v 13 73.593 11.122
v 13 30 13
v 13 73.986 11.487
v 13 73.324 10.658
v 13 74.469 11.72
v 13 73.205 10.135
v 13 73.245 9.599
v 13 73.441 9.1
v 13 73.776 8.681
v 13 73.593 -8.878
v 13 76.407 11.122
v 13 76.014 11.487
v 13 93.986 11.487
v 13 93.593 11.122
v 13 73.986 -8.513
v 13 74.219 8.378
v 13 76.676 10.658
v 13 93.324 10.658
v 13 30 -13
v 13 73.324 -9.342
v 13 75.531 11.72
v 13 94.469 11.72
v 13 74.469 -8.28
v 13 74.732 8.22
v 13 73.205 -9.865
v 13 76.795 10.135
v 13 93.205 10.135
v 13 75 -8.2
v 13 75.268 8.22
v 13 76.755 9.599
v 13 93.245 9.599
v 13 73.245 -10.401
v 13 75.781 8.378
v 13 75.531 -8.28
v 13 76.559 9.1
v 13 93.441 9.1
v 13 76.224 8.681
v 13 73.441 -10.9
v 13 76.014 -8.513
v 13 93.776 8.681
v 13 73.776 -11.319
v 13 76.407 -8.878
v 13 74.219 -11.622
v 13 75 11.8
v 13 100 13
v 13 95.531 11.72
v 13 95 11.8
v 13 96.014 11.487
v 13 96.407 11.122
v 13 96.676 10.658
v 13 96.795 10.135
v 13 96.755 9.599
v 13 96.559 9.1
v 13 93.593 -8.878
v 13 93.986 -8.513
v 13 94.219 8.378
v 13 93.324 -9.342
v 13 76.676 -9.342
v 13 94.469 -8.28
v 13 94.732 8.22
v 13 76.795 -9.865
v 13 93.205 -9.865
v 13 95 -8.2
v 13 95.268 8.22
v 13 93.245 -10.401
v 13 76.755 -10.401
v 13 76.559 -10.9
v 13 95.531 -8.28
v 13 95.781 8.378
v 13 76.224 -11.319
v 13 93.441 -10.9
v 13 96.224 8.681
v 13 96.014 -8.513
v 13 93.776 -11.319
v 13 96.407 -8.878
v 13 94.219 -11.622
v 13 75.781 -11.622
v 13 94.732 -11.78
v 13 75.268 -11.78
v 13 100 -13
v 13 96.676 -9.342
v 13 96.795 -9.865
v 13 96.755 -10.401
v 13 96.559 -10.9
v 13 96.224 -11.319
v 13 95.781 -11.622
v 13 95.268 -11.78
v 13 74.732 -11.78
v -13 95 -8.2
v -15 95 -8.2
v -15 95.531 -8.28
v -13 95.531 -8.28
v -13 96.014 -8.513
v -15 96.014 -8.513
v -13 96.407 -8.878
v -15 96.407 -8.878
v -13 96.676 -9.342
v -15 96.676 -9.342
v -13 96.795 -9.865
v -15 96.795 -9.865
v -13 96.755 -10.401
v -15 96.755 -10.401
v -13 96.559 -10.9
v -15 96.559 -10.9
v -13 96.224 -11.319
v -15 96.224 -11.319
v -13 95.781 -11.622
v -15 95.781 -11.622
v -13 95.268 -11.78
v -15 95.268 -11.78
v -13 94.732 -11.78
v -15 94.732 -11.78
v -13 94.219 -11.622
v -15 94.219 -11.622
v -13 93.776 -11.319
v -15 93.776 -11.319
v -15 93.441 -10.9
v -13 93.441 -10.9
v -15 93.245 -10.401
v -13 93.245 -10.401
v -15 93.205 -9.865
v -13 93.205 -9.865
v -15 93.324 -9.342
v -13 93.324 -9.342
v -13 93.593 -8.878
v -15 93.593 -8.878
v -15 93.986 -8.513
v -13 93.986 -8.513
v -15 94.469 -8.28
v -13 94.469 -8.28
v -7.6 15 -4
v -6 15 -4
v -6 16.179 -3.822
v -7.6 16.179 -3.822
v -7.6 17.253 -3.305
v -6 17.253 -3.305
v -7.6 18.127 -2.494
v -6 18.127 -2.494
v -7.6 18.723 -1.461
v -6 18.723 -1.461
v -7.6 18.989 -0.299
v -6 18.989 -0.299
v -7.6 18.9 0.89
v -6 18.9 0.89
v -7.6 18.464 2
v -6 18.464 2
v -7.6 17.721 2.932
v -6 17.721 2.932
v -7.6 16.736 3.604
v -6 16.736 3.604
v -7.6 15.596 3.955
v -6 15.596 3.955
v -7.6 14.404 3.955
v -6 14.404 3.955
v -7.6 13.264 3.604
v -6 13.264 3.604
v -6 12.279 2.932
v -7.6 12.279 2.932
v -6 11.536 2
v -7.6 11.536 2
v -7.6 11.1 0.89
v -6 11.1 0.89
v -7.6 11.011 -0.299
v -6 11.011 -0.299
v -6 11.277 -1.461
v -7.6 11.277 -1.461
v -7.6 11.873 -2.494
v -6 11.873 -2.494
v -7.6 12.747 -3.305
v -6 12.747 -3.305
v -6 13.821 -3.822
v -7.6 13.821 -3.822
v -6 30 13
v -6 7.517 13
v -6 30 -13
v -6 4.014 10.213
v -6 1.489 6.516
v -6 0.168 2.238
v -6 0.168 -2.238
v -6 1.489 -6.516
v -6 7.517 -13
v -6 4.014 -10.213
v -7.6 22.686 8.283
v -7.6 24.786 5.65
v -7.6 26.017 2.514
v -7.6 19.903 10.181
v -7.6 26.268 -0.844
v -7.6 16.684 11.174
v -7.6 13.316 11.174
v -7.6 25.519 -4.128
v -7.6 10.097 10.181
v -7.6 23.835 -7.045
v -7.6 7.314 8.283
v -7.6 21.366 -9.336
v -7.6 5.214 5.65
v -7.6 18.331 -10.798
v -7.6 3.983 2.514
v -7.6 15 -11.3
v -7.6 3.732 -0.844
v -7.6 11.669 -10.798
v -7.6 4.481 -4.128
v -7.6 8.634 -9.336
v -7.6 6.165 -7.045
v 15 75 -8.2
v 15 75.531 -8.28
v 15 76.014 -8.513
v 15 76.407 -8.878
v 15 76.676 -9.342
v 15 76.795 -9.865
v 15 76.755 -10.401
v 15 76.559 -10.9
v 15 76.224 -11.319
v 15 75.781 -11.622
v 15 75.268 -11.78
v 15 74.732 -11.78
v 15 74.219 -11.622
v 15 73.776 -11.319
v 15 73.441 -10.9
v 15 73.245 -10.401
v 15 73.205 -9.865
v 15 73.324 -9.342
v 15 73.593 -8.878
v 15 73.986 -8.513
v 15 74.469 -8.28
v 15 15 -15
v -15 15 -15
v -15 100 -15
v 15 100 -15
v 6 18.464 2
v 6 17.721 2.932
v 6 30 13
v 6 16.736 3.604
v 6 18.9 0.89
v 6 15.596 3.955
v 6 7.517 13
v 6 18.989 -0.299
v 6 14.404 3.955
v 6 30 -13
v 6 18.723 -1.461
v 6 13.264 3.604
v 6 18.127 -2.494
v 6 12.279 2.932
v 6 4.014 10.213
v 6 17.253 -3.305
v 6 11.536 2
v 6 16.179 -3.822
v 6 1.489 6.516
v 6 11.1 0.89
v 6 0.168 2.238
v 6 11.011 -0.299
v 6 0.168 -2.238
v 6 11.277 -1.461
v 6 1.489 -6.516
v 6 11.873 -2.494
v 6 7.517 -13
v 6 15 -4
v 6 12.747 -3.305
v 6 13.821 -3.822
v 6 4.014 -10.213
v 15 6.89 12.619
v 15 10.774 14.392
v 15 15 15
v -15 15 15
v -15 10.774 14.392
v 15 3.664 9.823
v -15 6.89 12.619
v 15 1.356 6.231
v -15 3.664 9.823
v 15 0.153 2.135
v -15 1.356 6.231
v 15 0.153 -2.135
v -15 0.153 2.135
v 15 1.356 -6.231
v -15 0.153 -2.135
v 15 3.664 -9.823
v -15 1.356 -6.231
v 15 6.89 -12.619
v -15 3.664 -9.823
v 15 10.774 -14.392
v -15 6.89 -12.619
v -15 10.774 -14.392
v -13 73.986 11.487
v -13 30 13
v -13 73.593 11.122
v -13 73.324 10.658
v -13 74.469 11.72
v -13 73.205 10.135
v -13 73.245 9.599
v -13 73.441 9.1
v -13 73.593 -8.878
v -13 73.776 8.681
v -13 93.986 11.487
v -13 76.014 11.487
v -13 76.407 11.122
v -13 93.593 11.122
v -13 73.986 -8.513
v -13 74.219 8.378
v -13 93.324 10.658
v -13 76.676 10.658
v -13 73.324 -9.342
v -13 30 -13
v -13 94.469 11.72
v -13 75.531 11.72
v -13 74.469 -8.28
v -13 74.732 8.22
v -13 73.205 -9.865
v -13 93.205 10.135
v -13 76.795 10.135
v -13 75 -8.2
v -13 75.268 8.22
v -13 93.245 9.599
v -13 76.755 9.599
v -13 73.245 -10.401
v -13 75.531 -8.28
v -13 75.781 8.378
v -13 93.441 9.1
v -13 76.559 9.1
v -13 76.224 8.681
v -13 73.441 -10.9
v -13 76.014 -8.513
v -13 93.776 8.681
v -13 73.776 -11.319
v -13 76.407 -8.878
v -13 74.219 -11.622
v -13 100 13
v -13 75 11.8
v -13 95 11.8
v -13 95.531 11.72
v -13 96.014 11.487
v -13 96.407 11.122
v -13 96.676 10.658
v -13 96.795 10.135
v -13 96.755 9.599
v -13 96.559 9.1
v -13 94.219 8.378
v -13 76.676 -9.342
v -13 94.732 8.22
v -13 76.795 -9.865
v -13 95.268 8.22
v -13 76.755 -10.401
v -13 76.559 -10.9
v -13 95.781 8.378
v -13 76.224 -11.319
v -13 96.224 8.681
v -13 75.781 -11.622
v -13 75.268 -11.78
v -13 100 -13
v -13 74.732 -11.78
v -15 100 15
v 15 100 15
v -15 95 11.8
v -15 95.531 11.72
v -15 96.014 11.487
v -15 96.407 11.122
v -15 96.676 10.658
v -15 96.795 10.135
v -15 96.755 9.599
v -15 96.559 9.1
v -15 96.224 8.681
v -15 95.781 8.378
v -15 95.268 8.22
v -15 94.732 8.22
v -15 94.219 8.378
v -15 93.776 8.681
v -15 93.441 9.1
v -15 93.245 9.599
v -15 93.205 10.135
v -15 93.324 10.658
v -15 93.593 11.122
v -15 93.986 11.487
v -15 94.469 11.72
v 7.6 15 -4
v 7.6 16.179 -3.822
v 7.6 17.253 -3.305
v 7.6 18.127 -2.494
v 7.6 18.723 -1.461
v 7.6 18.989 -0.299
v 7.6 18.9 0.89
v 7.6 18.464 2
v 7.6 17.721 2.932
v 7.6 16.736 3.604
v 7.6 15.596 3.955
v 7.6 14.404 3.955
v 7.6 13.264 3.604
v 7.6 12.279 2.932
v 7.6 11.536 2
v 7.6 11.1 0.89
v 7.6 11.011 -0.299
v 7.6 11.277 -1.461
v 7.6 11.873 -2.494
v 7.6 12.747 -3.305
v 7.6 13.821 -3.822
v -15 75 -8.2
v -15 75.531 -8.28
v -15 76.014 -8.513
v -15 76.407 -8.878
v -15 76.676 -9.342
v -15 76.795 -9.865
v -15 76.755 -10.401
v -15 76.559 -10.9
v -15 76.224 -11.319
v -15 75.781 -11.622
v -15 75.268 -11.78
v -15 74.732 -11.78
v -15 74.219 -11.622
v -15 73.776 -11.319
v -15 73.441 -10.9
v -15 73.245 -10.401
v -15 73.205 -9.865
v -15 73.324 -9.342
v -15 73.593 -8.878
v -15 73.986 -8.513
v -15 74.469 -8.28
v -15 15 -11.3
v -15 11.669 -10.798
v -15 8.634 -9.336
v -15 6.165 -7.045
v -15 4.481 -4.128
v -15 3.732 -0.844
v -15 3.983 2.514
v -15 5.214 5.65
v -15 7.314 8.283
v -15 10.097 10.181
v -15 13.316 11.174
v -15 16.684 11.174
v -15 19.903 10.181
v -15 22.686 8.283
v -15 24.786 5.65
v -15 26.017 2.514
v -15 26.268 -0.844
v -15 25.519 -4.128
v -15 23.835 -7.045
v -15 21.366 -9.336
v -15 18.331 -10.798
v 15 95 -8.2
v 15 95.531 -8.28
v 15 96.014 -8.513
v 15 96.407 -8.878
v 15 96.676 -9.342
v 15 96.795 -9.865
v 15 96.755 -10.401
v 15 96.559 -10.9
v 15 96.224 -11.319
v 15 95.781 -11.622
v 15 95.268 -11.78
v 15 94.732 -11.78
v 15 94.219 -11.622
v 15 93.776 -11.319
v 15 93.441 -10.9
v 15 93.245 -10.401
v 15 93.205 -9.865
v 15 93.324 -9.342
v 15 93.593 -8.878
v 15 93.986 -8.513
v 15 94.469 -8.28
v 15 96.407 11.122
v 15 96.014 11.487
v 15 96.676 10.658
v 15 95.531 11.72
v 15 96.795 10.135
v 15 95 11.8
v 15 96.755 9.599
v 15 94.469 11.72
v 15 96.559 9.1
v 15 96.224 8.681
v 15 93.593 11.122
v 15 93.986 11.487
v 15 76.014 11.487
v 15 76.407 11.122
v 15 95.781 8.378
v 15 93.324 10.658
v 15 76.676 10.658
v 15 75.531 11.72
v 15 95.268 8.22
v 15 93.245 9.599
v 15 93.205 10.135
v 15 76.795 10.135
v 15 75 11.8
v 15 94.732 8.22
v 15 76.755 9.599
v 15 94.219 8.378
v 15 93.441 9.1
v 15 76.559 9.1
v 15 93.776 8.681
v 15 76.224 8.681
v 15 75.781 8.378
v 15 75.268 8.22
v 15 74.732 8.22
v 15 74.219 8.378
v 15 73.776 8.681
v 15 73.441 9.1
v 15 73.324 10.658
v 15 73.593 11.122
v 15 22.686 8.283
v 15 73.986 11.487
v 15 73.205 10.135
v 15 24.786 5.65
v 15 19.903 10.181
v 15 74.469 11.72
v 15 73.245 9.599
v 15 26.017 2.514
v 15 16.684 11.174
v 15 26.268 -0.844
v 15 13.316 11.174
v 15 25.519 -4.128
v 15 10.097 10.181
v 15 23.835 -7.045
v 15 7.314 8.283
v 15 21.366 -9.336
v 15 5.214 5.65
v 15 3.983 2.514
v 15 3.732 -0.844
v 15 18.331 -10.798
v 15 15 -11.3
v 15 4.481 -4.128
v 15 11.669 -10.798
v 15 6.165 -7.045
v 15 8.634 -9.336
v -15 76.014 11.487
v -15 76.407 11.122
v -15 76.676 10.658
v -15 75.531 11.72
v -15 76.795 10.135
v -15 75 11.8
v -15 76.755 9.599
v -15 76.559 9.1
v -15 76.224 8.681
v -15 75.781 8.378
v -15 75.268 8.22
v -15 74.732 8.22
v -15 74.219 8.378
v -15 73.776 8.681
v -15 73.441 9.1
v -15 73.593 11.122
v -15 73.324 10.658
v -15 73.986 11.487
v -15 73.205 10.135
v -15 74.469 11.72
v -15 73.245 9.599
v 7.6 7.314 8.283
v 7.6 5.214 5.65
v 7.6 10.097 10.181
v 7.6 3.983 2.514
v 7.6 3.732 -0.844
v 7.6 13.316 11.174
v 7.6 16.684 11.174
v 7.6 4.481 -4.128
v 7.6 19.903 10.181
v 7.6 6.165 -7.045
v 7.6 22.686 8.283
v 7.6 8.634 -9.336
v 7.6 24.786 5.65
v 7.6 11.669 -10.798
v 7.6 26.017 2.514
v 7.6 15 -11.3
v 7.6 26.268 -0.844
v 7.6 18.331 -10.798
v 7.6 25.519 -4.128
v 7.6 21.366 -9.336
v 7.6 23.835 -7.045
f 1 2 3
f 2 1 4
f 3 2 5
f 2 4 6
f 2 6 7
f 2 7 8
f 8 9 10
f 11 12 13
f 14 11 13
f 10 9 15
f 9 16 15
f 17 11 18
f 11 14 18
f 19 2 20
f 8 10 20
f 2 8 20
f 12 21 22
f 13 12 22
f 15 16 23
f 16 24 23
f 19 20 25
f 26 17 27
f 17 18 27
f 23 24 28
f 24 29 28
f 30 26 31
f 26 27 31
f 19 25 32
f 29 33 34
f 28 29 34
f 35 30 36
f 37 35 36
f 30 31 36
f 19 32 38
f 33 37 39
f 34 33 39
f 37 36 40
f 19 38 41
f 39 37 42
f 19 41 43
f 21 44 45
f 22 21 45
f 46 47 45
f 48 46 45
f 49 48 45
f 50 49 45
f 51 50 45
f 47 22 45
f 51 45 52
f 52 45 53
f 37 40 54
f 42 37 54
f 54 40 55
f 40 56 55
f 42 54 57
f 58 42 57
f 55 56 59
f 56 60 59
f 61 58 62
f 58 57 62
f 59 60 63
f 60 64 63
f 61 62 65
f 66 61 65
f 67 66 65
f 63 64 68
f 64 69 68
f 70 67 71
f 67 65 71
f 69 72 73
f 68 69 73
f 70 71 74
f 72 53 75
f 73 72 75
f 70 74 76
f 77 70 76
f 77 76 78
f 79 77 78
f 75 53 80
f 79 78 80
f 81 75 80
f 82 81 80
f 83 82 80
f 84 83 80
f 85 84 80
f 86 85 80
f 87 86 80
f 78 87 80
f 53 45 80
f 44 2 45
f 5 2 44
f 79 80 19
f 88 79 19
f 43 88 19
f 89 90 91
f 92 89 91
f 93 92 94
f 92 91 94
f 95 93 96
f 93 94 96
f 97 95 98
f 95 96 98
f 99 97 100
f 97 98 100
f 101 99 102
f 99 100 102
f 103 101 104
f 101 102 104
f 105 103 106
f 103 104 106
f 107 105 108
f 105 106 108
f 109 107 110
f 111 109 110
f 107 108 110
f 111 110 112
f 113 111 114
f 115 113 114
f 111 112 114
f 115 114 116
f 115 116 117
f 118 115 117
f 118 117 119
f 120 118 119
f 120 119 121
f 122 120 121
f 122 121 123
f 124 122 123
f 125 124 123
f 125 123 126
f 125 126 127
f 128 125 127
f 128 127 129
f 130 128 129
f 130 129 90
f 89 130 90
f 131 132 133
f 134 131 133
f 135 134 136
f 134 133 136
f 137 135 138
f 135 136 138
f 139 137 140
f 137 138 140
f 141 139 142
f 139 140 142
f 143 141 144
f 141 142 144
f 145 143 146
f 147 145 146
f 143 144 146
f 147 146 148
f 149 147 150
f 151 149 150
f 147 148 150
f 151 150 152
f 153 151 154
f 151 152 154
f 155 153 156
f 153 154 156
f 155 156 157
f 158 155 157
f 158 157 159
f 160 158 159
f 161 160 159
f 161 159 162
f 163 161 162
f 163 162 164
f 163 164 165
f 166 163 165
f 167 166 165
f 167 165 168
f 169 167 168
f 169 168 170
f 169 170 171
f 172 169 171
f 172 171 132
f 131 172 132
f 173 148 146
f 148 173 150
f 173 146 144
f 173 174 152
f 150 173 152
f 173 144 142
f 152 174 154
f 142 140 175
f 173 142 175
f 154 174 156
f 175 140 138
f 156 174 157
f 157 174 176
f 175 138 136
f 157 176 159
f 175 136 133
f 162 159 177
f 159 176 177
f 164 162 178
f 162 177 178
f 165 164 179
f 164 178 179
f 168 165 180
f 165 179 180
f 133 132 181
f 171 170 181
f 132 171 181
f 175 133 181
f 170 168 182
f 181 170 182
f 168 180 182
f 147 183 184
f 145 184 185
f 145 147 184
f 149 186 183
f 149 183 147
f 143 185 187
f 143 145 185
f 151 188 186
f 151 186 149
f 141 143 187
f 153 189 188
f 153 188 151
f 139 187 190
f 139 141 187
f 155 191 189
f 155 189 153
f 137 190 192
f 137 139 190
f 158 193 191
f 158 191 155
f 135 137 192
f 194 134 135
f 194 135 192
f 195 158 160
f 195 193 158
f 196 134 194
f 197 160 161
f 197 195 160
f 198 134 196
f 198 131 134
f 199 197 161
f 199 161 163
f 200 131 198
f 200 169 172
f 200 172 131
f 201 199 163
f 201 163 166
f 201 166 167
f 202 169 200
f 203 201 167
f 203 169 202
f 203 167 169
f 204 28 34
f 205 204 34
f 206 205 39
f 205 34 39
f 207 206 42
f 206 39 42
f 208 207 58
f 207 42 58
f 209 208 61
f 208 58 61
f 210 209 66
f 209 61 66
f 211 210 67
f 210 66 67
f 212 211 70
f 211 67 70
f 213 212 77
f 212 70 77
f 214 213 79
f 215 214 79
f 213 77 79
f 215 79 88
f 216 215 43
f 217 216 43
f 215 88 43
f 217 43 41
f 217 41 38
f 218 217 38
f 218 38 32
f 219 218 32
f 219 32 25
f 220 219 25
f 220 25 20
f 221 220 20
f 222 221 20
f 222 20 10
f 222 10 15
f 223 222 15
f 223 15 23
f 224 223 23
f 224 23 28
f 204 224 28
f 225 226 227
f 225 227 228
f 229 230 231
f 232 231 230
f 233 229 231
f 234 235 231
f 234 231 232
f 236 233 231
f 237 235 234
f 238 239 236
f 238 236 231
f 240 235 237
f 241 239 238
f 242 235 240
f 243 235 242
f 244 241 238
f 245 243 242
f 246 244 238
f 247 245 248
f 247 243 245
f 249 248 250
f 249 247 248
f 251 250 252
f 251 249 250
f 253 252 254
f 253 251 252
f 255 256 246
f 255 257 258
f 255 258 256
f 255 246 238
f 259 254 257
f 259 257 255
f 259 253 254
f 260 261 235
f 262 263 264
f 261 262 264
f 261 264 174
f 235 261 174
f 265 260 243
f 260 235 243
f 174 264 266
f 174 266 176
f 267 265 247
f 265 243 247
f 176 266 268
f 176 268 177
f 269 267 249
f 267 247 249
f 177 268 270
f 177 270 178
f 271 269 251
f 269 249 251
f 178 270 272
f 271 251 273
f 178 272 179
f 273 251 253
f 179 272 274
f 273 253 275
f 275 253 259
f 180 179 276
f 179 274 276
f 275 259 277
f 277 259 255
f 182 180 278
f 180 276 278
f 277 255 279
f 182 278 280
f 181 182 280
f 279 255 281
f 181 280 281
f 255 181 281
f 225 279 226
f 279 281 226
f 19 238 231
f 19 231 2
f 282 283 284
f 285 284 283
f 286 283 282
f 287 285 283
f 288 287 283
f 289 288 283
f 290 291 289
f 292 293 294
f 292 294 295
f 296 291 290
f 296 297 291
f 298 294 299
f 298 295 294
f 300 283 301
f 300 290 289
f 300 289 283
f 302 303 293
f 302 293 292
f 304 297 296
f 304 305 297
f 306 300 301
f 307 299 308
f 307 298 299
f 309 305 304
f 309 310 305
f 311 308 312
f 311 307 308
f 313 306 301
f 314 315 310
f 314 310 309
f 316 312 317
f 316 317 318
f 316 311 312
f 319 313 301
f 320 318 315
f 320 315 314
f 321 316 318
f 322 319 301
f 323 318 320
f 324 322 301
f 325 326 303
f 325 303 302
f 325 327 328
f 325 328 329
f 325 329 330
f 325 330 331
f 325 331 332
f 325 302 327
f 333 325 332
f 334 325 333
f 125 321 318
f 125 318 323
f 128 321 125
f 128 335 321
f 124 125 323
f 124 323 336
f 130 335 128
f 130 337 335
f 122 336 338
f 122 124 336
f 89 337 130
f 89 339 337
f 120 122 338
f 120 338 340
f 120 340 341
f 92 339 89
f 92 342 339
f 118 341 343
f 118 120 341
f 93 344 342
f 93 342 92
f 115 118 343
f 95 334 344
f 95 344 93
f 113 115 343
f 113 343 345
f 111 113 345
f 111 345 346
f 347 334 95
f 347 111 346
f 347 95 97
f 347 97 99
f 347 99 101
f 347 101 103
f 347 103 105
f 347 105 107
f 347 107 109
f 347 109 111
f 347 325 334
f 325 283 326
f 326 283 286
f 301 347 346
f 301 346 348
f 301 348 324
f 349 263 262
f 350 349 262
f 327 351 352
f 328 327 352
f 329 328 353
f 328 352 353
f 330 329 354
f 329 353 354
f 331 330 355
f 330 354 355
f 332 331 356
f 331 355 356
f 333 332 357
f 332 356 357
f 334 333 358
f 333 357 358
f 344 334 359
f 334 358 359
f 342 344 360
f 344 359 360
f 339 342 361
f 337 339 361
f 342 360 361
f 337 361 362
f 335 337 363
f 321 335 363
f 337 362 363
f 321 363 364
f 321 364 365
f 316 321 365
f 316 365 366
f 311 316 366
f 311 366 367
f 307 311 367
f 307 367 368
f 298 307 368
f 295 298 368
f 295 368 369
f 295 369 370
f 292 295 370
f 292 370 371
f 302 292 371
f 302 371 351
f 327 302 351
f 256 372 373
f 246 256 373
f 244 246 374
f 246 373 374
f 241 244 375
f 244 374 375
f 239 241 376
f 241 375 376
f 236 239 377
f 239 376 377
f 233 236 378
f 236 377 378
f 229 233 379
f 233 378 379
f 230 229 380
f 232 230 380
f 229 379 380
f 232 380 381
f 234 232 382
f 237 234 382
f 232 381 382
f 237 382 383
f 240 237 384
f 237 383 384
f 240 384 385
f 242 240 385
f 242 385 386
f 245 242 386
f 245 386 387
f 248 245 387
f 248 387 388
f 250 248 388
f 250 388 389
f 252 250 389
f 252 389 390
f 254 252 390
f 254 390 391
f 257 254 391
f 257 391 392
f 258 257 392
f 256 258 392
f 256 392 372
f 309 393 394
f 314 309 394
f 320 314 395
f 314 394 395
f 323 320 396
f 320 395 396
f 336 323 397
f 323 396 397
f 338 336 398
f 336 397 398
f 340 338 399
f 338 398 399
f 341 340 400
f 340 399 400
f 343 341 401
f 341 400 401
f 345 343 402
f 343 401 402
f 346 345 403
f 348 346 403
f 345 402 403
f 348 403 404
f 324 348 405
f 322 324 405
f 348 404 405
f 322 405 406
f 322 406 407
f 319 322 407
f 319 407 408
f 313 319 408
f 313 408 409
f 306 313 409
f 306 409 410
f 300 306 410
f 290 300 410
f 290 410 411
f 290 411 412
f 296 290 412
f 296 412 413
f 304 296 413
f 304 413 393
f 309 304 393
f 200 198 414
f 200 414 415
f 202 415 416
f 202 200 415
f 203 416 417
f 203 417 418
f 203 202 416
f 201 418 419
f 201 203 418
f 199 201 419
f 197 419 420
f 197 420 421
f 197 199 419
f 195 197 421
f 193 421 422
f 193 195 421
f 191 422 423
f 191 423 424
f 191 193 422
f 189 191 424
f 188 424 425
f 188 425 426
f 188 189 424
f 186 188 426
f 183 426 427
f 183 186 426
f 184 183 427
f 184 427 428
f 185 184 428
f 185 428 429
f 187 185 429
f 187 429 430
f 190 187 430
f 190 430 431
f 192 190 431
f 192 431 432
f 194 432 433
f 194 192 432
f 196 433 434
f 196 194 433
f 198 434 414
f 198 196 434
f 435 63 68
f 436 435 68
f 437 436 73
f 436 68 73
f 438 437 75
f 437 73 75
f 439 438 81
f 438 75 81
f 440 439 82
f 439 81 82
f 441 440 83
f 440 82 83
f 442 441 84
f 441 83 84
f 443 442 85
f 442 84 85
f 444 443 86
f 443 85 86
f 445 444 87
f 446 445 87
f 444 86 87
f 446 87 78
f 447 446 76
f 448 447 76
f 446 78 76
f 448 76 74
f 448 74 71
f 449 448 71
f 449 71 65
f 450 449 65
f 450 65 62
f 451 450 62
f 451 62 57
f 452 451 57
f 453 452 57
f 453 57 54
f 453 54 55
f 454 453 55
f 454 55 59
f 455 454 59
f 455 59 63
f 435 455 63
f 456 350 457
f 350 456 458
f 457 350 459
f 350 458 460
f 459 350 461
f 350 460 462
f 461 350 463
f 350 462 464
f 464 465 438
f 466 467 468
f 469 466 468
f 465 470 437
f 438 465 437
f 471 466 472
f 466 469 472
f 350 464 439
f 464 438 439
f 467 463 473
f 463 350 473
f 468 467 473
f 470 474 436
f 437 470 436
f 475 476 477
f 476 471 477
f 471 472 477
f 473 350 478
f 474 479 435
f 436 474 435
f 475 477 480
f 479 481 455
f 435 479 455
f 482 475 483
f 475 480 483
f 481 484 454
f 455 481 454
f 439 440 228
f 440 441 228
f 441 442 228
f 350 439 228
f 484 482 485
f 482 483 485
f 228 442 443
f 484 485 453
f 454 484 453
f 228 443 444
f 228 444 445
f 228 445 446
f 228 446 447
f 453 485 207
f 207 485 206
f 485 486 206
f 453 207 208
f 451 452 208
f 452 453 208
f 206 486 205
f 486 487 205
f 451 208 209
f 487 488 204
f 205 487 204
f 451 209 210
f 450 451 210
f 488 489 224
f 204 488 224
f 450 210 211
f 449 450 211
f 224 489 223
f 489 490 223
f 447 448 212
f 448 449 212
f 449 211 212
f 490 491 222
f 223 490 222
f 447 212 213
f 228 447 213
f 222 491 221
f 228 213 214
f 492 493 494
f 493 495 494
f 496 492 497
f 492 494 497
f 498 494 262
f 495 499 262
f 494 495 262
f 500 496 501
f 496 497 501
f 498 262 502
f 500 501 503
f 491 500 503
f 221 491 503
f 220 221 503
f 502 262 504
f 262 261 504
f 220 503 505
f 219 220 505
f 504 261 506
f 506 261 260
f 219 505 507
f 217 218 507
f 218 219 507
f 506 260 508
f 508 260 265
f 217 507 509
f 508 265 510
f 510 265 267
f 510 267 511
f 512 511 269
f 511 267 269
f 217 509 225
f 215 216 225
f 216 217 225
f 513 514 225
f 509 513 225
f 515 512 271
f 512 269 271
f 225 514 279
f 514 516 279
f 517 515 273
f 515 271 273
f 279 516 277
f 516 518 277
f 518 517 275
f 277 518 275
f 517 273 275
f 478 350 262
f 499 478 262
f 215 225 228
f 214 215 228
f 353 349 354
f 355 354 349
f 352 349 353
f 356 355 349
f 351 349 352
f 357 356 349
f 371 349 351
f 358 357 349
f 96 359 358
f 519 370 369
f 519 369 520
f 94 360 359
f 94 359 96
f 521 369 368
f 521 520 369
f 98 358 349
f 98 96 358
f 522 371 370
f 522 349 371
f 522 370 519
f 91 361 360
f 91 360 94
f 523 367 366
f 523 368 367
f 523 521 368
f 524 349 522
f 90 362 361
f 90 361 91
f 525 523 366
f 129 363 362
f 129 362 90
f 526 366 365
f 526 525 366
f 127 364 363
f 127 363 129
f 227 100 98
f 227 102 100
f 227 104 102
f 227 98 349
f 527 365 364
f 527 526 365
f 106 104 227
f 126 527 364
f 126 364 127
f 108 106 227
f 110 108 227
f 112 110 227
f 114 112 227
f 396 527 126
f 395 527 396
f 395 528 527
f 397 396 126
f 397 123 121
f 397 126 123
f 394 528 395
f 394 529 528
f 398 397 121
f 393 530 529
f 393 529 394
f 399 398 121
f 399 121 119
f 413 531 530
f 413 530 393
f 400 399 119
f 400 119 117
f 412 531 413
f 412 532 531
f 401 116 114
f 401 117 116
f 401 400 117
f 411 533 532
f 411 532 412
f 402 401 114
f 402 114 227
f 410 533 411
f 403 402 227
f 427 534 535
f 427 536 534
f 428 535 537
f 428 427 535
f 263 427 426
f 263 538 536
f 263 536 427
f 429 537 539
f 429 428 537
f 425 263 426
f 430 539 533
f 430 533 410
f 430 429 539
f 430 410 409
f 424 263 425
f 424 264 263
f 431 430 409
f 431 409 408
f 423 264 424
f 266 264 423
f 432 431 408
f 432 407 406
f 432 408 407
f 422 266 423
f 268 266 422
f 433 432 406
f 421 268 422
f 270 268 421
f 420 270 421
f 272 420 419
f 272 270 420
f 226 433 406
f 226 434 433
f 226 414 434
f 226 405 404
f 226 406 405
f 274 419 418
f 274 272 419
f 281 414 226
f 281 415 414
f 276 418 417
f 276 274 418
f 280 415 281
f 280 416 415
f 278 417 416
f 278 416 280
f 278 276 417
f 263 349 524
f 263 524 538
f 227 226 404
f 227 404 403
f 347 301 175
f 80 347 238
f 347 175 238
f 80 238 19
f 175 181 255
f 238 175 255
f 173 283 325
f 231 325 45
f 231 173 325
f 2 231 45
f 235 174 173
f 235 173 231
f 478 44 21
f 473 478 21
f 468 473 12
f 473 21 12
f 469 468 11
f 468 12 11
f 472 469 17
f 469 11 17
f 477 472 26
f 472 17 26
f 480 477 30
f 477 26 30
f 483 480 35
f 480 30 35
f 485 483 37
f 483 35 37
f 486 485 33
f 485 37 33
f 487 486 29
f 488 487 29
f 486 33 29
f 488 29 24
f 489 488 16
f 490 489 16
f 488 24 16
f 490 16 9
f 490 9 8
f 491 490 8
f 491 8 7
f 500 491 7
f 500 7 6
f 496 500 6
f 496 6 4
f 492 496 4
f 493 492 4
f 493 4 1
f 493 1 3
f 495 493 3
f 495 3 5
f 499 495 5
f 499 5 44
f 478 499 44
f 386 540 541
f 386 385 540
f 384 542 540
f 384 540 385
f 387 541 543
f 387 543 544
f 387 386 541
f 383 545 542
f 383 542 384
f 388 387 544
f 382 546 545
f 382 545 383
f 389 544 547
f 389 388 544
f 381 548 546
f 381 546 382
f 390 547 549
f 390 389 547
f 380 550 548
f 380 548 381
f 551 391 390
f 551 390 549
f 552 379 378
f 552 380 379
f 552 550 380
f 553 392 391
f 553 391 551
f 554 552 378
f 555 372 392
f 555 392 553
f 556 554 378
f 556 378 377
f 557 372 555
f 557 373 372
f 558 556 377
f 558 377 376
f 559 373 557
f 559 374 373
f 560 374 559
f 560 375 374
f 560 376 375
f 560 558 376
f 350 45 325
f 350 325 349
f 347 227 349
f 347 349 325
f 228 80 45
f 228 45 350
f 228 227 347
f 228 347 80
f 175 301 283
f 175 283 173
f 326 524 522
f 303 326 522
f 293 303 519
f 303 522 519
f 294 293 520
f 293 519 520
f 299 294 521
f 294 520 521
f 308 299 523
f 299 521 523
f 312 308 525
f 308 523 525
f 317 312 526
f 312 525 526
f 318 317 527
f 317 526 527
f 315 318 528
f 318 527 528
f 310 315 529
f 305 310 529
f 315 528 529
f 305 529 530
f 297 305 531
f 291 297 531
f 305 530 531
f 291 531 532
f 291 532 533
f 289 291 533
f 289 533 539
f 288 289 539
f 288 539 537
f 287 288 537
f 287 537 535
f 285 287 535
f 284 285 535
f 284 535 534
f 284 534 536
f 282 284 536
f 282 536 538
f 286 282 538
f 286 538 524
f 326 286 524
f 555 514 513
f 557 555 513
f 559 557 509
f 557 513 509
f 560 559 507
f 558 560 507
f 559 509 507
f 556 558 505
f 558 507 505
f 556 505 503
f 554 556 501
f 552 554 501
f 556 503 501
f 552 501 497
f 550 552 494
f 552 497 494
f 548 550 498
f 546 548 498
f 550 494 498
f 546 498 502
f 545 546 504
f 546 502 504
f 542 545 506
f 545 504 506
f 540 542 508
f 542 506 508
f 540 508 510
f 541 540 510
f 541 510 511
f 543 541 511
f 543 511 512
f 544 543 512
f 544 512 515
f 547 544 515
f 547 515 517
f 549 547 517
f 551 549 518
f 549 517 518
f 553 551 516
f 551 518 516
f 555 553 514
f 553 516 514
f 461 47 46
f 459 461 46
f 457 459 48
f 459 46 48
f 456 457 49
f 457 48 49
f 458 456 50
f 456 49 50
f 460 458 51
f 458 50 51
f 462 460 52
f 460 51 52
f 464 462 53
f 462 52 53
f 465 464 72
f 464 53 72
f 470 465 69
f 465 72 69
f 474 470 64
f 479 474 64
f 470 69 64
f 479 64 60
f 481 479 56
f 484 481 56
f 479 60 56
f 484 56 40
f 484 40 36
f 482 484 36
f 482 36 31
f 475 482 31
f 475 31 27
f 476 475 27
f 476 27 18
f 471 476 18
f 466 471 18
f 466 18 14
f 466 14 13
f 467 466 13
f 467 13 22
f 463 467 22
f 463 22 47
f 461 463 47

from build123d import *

# Parameters (mm, degrees)
SKETCH1_W            = 30
SKETCH1_H            = 30
SKETCH1_W_2          = 12
SKETCH1_H_2          = 26
BOSS_EXTRUDE2_DEPTH  = 100
SKETCH3_W            = 7
SKETCH3_H            = 26
CUT_EXTRUDE2_DEPTH   = 70
FILLET1_R            = 15
SKETCH5_R            = 4
CUT_EXTRUDE3_DEPTH   = 50
SKETCH6_R            = 11.3
CUT_EXTRUDE4_DEPTH   = 7.4
CUT_EXTRUDE5_START   = -7.4
SKETCH7_R            = 11.3
CUT_EXTRUDE5_DEPTH   = 7.4
M3_CLEARANCE_HOLE1_D = 3.6


with BuildPart() as part:
    # Sketch1 → Boss-Extrude2 (new body)
    with BuildSketch(Plane(origin=(0, 0, 0), x_dir=(1, 0, 0), z_dir=(0, 1, 0))):
        Rectangle(SKETCH1_W, SKETCH1_H)
        Rectangle(SKETCH1_W_2, SKETCH1_H_2, mode=Mode.SUBTRACT)
    extrude(amount=BOSS_EXTRUDE2_DEPTH)

    # Sketch3 → Cut-Extrude2 (cut)
    with BuildSketch(Plane(origin=(0, 100, 0), x_dir=(1, 0, 0), z_dir=(0, 1, 0))):
        with Locations((-9.5, 0)):
            Rectangle(SKETCH3_W, SKETCH3_H)
        with Locations((9.5, 0)):
            Rectangle(SKETCH3_W, SKETCH3_H)
    extrude(amount=-CUT_EXTRUDE2_DEPTH, mode=Mode.SUBTRACT)

    # Fillet1
    # the kernel refuses this fillet: 15 mm, written as the material it takes off along each edge
    with BuildSketch(Plane(origin=(52.5, 0, -15), x_dir=(0, 1, 0), z_dir=(-1, 0, 0)), Plane(origin=(-52.5, 0, 15), x_dir=(0, 1, 0), z_dir=(1, 0, 0))) as fillet1_piece_1:
        with BuildLine():
            CenterArc((FILLET1_R, -FILLET1_R), FILLET1_R, 90, 90)
            Line((0, -FILLET1_R), (0, 0))
            Line((0, 0), (FILLET1_R, 0))
        make_face()
    extrude(amount=105, mode=Mode.SUBTRACT)

    # Sketch5 → Cut-Extrude3 (cut)
    with BuildSketch(Plane(origin=(15, 0, 0), x_dir=(0, 0, -1), z_dir=(1, 0, 0))):
        with Locations((0, 15)):
            Circle(SKETCH5_R)
    extrude(amount=-CUT_EXTRUDE3_DEPTH, mode=Mode.SUBTRACT)

    # Sketch6 → Cut-Extrude4 (cut)
    with BuildSketch(Plane(origin=(15, 0, 0), x_dir=(0, 0, -1), z_dir=(1, 0, 0))):
        with Locations((0, 15)):
            Circle(SKETCH6_R)
    extrude(amount=-CUT_EXTRUDE4_DEPTH, mode=Mode.SUBTRACT)

    # Sketch7 → Cut-Extrude5 (cut)
    with BuildSketch(Plane.ZY.offset(15).offset(CUT_EXTRUDE5_START)):
        with Locations(Location((0, 15, 0), (0, 0, 180))):
            Circle(SKETCH7_R)
    extrude(amount=CUT_EXTRUDE5_DEPTH, mode=Mode.SUBTRACT)

    # M3 Clearance Hole1 (through all)
    with Locations(Plane(origin=(15, 0, 0), x_dir=(0, 0, -1), z_dir=(1, 0, 0))):
        with Locations((-10, 95), (-10, 75), (10, 75), (10, 95)):
            Hole(M3_CLEARANCE_HOLE1_D / 2)


solid = part.part
